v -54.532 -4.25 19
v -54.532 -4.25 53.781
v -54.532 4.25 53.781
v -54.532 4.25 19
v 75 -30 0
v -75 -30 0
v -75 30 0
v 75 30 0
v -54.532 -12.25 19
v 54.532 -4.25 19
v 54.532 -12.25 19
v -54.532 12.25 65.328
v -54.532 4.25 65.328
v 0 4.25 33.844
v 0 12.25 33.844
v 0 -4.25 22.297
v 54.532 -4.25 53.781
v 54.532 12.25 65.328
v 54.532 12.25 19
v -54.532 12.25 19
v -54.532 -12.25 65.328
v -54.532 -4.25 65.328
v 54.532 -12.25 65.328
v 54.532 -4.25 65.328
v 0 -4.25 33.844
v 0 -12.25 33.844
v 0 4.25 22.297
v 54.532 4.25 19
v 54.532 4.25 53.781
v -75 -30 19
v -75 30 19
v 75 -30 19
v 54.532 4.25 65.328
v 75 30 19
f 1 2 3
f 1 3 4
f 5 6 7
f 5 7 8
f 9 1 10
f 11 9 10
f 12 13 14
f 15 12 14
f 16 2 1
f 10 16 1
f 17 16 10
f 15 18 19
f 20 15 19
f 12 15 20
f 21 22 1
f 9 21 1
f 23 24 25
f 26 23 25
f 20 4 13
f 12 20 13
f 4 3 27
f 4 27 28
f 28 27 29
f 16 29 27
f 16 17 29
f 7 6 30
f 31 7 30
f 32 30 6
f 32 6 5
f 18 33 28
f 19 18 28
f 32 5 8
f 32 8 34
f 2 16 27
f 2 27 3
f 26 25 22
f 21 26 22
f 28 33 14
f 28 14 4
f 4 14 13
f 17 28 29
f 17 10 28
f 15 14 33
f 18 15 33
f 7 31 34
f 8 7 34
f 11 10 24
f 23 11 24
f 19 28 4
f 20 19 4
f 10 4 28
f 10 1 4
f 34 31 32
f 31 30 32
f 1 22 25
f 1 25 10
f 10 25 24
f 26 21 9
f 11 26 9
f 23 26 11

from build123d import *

# Parameters (mm, degrees)
F0_W     = 150
F0_H     = 19
F1_DEPTH = 30
F3_DEPTH = 4.25
F5_DEPTH = 8
F7_DEPTH = 8


with BuildPart() as f1:
    # F0 (on Front) → F1 (new body, symmetric)
    with BuildSketch(Plane.XZ):
        with Locations((0, 9.5)):
            Rectangle(F0_W, F0_H)
    extrude(amount=F1_DEPTH, both=True)


with BuildPart() as f3:
    # F2 (on Front) → F3 (new body, symmetric)
    with BuildSketch(Plane.XZ):
        Polygon((54.5325, 53.781214), (0, 22.296861), (-54.5325, 53.781214), (-54.5325, 19), (54.5325, 19), align=None)
    extrude(amount=F3_DEPTH, both=True)


with BuildPart() as f5:
    # F4 (on face) → F5 (new body)
    with BuildSketch(Plane.XZ.offset(4.25)):
        Polygon((54.5325, 65.32822), (0, 33.843866), (-54.5325, 65.32822), (-54.5325, 19), (54.5325, 19), align=None)
    extrude(amount=F5_DEPTH)


with BuildPart() as f7:
    # F6 (on face) → F7 (new body)
    with BuildSketch(Plane(origin=(0, 4.25, 0), x_dir=(-1, 0, 0), z_dir=(0, 1, 0))):
        Polygon((54.5325, 19), (54.5325, 65.32822), (0, 33.843866), (-54.5325, 65.32822), (-54.5325, 19), align=None)
    extrude(amount=F7_DEPTH)


solid = Compound([f1.part, f3.part, f5.part, f7.part])
